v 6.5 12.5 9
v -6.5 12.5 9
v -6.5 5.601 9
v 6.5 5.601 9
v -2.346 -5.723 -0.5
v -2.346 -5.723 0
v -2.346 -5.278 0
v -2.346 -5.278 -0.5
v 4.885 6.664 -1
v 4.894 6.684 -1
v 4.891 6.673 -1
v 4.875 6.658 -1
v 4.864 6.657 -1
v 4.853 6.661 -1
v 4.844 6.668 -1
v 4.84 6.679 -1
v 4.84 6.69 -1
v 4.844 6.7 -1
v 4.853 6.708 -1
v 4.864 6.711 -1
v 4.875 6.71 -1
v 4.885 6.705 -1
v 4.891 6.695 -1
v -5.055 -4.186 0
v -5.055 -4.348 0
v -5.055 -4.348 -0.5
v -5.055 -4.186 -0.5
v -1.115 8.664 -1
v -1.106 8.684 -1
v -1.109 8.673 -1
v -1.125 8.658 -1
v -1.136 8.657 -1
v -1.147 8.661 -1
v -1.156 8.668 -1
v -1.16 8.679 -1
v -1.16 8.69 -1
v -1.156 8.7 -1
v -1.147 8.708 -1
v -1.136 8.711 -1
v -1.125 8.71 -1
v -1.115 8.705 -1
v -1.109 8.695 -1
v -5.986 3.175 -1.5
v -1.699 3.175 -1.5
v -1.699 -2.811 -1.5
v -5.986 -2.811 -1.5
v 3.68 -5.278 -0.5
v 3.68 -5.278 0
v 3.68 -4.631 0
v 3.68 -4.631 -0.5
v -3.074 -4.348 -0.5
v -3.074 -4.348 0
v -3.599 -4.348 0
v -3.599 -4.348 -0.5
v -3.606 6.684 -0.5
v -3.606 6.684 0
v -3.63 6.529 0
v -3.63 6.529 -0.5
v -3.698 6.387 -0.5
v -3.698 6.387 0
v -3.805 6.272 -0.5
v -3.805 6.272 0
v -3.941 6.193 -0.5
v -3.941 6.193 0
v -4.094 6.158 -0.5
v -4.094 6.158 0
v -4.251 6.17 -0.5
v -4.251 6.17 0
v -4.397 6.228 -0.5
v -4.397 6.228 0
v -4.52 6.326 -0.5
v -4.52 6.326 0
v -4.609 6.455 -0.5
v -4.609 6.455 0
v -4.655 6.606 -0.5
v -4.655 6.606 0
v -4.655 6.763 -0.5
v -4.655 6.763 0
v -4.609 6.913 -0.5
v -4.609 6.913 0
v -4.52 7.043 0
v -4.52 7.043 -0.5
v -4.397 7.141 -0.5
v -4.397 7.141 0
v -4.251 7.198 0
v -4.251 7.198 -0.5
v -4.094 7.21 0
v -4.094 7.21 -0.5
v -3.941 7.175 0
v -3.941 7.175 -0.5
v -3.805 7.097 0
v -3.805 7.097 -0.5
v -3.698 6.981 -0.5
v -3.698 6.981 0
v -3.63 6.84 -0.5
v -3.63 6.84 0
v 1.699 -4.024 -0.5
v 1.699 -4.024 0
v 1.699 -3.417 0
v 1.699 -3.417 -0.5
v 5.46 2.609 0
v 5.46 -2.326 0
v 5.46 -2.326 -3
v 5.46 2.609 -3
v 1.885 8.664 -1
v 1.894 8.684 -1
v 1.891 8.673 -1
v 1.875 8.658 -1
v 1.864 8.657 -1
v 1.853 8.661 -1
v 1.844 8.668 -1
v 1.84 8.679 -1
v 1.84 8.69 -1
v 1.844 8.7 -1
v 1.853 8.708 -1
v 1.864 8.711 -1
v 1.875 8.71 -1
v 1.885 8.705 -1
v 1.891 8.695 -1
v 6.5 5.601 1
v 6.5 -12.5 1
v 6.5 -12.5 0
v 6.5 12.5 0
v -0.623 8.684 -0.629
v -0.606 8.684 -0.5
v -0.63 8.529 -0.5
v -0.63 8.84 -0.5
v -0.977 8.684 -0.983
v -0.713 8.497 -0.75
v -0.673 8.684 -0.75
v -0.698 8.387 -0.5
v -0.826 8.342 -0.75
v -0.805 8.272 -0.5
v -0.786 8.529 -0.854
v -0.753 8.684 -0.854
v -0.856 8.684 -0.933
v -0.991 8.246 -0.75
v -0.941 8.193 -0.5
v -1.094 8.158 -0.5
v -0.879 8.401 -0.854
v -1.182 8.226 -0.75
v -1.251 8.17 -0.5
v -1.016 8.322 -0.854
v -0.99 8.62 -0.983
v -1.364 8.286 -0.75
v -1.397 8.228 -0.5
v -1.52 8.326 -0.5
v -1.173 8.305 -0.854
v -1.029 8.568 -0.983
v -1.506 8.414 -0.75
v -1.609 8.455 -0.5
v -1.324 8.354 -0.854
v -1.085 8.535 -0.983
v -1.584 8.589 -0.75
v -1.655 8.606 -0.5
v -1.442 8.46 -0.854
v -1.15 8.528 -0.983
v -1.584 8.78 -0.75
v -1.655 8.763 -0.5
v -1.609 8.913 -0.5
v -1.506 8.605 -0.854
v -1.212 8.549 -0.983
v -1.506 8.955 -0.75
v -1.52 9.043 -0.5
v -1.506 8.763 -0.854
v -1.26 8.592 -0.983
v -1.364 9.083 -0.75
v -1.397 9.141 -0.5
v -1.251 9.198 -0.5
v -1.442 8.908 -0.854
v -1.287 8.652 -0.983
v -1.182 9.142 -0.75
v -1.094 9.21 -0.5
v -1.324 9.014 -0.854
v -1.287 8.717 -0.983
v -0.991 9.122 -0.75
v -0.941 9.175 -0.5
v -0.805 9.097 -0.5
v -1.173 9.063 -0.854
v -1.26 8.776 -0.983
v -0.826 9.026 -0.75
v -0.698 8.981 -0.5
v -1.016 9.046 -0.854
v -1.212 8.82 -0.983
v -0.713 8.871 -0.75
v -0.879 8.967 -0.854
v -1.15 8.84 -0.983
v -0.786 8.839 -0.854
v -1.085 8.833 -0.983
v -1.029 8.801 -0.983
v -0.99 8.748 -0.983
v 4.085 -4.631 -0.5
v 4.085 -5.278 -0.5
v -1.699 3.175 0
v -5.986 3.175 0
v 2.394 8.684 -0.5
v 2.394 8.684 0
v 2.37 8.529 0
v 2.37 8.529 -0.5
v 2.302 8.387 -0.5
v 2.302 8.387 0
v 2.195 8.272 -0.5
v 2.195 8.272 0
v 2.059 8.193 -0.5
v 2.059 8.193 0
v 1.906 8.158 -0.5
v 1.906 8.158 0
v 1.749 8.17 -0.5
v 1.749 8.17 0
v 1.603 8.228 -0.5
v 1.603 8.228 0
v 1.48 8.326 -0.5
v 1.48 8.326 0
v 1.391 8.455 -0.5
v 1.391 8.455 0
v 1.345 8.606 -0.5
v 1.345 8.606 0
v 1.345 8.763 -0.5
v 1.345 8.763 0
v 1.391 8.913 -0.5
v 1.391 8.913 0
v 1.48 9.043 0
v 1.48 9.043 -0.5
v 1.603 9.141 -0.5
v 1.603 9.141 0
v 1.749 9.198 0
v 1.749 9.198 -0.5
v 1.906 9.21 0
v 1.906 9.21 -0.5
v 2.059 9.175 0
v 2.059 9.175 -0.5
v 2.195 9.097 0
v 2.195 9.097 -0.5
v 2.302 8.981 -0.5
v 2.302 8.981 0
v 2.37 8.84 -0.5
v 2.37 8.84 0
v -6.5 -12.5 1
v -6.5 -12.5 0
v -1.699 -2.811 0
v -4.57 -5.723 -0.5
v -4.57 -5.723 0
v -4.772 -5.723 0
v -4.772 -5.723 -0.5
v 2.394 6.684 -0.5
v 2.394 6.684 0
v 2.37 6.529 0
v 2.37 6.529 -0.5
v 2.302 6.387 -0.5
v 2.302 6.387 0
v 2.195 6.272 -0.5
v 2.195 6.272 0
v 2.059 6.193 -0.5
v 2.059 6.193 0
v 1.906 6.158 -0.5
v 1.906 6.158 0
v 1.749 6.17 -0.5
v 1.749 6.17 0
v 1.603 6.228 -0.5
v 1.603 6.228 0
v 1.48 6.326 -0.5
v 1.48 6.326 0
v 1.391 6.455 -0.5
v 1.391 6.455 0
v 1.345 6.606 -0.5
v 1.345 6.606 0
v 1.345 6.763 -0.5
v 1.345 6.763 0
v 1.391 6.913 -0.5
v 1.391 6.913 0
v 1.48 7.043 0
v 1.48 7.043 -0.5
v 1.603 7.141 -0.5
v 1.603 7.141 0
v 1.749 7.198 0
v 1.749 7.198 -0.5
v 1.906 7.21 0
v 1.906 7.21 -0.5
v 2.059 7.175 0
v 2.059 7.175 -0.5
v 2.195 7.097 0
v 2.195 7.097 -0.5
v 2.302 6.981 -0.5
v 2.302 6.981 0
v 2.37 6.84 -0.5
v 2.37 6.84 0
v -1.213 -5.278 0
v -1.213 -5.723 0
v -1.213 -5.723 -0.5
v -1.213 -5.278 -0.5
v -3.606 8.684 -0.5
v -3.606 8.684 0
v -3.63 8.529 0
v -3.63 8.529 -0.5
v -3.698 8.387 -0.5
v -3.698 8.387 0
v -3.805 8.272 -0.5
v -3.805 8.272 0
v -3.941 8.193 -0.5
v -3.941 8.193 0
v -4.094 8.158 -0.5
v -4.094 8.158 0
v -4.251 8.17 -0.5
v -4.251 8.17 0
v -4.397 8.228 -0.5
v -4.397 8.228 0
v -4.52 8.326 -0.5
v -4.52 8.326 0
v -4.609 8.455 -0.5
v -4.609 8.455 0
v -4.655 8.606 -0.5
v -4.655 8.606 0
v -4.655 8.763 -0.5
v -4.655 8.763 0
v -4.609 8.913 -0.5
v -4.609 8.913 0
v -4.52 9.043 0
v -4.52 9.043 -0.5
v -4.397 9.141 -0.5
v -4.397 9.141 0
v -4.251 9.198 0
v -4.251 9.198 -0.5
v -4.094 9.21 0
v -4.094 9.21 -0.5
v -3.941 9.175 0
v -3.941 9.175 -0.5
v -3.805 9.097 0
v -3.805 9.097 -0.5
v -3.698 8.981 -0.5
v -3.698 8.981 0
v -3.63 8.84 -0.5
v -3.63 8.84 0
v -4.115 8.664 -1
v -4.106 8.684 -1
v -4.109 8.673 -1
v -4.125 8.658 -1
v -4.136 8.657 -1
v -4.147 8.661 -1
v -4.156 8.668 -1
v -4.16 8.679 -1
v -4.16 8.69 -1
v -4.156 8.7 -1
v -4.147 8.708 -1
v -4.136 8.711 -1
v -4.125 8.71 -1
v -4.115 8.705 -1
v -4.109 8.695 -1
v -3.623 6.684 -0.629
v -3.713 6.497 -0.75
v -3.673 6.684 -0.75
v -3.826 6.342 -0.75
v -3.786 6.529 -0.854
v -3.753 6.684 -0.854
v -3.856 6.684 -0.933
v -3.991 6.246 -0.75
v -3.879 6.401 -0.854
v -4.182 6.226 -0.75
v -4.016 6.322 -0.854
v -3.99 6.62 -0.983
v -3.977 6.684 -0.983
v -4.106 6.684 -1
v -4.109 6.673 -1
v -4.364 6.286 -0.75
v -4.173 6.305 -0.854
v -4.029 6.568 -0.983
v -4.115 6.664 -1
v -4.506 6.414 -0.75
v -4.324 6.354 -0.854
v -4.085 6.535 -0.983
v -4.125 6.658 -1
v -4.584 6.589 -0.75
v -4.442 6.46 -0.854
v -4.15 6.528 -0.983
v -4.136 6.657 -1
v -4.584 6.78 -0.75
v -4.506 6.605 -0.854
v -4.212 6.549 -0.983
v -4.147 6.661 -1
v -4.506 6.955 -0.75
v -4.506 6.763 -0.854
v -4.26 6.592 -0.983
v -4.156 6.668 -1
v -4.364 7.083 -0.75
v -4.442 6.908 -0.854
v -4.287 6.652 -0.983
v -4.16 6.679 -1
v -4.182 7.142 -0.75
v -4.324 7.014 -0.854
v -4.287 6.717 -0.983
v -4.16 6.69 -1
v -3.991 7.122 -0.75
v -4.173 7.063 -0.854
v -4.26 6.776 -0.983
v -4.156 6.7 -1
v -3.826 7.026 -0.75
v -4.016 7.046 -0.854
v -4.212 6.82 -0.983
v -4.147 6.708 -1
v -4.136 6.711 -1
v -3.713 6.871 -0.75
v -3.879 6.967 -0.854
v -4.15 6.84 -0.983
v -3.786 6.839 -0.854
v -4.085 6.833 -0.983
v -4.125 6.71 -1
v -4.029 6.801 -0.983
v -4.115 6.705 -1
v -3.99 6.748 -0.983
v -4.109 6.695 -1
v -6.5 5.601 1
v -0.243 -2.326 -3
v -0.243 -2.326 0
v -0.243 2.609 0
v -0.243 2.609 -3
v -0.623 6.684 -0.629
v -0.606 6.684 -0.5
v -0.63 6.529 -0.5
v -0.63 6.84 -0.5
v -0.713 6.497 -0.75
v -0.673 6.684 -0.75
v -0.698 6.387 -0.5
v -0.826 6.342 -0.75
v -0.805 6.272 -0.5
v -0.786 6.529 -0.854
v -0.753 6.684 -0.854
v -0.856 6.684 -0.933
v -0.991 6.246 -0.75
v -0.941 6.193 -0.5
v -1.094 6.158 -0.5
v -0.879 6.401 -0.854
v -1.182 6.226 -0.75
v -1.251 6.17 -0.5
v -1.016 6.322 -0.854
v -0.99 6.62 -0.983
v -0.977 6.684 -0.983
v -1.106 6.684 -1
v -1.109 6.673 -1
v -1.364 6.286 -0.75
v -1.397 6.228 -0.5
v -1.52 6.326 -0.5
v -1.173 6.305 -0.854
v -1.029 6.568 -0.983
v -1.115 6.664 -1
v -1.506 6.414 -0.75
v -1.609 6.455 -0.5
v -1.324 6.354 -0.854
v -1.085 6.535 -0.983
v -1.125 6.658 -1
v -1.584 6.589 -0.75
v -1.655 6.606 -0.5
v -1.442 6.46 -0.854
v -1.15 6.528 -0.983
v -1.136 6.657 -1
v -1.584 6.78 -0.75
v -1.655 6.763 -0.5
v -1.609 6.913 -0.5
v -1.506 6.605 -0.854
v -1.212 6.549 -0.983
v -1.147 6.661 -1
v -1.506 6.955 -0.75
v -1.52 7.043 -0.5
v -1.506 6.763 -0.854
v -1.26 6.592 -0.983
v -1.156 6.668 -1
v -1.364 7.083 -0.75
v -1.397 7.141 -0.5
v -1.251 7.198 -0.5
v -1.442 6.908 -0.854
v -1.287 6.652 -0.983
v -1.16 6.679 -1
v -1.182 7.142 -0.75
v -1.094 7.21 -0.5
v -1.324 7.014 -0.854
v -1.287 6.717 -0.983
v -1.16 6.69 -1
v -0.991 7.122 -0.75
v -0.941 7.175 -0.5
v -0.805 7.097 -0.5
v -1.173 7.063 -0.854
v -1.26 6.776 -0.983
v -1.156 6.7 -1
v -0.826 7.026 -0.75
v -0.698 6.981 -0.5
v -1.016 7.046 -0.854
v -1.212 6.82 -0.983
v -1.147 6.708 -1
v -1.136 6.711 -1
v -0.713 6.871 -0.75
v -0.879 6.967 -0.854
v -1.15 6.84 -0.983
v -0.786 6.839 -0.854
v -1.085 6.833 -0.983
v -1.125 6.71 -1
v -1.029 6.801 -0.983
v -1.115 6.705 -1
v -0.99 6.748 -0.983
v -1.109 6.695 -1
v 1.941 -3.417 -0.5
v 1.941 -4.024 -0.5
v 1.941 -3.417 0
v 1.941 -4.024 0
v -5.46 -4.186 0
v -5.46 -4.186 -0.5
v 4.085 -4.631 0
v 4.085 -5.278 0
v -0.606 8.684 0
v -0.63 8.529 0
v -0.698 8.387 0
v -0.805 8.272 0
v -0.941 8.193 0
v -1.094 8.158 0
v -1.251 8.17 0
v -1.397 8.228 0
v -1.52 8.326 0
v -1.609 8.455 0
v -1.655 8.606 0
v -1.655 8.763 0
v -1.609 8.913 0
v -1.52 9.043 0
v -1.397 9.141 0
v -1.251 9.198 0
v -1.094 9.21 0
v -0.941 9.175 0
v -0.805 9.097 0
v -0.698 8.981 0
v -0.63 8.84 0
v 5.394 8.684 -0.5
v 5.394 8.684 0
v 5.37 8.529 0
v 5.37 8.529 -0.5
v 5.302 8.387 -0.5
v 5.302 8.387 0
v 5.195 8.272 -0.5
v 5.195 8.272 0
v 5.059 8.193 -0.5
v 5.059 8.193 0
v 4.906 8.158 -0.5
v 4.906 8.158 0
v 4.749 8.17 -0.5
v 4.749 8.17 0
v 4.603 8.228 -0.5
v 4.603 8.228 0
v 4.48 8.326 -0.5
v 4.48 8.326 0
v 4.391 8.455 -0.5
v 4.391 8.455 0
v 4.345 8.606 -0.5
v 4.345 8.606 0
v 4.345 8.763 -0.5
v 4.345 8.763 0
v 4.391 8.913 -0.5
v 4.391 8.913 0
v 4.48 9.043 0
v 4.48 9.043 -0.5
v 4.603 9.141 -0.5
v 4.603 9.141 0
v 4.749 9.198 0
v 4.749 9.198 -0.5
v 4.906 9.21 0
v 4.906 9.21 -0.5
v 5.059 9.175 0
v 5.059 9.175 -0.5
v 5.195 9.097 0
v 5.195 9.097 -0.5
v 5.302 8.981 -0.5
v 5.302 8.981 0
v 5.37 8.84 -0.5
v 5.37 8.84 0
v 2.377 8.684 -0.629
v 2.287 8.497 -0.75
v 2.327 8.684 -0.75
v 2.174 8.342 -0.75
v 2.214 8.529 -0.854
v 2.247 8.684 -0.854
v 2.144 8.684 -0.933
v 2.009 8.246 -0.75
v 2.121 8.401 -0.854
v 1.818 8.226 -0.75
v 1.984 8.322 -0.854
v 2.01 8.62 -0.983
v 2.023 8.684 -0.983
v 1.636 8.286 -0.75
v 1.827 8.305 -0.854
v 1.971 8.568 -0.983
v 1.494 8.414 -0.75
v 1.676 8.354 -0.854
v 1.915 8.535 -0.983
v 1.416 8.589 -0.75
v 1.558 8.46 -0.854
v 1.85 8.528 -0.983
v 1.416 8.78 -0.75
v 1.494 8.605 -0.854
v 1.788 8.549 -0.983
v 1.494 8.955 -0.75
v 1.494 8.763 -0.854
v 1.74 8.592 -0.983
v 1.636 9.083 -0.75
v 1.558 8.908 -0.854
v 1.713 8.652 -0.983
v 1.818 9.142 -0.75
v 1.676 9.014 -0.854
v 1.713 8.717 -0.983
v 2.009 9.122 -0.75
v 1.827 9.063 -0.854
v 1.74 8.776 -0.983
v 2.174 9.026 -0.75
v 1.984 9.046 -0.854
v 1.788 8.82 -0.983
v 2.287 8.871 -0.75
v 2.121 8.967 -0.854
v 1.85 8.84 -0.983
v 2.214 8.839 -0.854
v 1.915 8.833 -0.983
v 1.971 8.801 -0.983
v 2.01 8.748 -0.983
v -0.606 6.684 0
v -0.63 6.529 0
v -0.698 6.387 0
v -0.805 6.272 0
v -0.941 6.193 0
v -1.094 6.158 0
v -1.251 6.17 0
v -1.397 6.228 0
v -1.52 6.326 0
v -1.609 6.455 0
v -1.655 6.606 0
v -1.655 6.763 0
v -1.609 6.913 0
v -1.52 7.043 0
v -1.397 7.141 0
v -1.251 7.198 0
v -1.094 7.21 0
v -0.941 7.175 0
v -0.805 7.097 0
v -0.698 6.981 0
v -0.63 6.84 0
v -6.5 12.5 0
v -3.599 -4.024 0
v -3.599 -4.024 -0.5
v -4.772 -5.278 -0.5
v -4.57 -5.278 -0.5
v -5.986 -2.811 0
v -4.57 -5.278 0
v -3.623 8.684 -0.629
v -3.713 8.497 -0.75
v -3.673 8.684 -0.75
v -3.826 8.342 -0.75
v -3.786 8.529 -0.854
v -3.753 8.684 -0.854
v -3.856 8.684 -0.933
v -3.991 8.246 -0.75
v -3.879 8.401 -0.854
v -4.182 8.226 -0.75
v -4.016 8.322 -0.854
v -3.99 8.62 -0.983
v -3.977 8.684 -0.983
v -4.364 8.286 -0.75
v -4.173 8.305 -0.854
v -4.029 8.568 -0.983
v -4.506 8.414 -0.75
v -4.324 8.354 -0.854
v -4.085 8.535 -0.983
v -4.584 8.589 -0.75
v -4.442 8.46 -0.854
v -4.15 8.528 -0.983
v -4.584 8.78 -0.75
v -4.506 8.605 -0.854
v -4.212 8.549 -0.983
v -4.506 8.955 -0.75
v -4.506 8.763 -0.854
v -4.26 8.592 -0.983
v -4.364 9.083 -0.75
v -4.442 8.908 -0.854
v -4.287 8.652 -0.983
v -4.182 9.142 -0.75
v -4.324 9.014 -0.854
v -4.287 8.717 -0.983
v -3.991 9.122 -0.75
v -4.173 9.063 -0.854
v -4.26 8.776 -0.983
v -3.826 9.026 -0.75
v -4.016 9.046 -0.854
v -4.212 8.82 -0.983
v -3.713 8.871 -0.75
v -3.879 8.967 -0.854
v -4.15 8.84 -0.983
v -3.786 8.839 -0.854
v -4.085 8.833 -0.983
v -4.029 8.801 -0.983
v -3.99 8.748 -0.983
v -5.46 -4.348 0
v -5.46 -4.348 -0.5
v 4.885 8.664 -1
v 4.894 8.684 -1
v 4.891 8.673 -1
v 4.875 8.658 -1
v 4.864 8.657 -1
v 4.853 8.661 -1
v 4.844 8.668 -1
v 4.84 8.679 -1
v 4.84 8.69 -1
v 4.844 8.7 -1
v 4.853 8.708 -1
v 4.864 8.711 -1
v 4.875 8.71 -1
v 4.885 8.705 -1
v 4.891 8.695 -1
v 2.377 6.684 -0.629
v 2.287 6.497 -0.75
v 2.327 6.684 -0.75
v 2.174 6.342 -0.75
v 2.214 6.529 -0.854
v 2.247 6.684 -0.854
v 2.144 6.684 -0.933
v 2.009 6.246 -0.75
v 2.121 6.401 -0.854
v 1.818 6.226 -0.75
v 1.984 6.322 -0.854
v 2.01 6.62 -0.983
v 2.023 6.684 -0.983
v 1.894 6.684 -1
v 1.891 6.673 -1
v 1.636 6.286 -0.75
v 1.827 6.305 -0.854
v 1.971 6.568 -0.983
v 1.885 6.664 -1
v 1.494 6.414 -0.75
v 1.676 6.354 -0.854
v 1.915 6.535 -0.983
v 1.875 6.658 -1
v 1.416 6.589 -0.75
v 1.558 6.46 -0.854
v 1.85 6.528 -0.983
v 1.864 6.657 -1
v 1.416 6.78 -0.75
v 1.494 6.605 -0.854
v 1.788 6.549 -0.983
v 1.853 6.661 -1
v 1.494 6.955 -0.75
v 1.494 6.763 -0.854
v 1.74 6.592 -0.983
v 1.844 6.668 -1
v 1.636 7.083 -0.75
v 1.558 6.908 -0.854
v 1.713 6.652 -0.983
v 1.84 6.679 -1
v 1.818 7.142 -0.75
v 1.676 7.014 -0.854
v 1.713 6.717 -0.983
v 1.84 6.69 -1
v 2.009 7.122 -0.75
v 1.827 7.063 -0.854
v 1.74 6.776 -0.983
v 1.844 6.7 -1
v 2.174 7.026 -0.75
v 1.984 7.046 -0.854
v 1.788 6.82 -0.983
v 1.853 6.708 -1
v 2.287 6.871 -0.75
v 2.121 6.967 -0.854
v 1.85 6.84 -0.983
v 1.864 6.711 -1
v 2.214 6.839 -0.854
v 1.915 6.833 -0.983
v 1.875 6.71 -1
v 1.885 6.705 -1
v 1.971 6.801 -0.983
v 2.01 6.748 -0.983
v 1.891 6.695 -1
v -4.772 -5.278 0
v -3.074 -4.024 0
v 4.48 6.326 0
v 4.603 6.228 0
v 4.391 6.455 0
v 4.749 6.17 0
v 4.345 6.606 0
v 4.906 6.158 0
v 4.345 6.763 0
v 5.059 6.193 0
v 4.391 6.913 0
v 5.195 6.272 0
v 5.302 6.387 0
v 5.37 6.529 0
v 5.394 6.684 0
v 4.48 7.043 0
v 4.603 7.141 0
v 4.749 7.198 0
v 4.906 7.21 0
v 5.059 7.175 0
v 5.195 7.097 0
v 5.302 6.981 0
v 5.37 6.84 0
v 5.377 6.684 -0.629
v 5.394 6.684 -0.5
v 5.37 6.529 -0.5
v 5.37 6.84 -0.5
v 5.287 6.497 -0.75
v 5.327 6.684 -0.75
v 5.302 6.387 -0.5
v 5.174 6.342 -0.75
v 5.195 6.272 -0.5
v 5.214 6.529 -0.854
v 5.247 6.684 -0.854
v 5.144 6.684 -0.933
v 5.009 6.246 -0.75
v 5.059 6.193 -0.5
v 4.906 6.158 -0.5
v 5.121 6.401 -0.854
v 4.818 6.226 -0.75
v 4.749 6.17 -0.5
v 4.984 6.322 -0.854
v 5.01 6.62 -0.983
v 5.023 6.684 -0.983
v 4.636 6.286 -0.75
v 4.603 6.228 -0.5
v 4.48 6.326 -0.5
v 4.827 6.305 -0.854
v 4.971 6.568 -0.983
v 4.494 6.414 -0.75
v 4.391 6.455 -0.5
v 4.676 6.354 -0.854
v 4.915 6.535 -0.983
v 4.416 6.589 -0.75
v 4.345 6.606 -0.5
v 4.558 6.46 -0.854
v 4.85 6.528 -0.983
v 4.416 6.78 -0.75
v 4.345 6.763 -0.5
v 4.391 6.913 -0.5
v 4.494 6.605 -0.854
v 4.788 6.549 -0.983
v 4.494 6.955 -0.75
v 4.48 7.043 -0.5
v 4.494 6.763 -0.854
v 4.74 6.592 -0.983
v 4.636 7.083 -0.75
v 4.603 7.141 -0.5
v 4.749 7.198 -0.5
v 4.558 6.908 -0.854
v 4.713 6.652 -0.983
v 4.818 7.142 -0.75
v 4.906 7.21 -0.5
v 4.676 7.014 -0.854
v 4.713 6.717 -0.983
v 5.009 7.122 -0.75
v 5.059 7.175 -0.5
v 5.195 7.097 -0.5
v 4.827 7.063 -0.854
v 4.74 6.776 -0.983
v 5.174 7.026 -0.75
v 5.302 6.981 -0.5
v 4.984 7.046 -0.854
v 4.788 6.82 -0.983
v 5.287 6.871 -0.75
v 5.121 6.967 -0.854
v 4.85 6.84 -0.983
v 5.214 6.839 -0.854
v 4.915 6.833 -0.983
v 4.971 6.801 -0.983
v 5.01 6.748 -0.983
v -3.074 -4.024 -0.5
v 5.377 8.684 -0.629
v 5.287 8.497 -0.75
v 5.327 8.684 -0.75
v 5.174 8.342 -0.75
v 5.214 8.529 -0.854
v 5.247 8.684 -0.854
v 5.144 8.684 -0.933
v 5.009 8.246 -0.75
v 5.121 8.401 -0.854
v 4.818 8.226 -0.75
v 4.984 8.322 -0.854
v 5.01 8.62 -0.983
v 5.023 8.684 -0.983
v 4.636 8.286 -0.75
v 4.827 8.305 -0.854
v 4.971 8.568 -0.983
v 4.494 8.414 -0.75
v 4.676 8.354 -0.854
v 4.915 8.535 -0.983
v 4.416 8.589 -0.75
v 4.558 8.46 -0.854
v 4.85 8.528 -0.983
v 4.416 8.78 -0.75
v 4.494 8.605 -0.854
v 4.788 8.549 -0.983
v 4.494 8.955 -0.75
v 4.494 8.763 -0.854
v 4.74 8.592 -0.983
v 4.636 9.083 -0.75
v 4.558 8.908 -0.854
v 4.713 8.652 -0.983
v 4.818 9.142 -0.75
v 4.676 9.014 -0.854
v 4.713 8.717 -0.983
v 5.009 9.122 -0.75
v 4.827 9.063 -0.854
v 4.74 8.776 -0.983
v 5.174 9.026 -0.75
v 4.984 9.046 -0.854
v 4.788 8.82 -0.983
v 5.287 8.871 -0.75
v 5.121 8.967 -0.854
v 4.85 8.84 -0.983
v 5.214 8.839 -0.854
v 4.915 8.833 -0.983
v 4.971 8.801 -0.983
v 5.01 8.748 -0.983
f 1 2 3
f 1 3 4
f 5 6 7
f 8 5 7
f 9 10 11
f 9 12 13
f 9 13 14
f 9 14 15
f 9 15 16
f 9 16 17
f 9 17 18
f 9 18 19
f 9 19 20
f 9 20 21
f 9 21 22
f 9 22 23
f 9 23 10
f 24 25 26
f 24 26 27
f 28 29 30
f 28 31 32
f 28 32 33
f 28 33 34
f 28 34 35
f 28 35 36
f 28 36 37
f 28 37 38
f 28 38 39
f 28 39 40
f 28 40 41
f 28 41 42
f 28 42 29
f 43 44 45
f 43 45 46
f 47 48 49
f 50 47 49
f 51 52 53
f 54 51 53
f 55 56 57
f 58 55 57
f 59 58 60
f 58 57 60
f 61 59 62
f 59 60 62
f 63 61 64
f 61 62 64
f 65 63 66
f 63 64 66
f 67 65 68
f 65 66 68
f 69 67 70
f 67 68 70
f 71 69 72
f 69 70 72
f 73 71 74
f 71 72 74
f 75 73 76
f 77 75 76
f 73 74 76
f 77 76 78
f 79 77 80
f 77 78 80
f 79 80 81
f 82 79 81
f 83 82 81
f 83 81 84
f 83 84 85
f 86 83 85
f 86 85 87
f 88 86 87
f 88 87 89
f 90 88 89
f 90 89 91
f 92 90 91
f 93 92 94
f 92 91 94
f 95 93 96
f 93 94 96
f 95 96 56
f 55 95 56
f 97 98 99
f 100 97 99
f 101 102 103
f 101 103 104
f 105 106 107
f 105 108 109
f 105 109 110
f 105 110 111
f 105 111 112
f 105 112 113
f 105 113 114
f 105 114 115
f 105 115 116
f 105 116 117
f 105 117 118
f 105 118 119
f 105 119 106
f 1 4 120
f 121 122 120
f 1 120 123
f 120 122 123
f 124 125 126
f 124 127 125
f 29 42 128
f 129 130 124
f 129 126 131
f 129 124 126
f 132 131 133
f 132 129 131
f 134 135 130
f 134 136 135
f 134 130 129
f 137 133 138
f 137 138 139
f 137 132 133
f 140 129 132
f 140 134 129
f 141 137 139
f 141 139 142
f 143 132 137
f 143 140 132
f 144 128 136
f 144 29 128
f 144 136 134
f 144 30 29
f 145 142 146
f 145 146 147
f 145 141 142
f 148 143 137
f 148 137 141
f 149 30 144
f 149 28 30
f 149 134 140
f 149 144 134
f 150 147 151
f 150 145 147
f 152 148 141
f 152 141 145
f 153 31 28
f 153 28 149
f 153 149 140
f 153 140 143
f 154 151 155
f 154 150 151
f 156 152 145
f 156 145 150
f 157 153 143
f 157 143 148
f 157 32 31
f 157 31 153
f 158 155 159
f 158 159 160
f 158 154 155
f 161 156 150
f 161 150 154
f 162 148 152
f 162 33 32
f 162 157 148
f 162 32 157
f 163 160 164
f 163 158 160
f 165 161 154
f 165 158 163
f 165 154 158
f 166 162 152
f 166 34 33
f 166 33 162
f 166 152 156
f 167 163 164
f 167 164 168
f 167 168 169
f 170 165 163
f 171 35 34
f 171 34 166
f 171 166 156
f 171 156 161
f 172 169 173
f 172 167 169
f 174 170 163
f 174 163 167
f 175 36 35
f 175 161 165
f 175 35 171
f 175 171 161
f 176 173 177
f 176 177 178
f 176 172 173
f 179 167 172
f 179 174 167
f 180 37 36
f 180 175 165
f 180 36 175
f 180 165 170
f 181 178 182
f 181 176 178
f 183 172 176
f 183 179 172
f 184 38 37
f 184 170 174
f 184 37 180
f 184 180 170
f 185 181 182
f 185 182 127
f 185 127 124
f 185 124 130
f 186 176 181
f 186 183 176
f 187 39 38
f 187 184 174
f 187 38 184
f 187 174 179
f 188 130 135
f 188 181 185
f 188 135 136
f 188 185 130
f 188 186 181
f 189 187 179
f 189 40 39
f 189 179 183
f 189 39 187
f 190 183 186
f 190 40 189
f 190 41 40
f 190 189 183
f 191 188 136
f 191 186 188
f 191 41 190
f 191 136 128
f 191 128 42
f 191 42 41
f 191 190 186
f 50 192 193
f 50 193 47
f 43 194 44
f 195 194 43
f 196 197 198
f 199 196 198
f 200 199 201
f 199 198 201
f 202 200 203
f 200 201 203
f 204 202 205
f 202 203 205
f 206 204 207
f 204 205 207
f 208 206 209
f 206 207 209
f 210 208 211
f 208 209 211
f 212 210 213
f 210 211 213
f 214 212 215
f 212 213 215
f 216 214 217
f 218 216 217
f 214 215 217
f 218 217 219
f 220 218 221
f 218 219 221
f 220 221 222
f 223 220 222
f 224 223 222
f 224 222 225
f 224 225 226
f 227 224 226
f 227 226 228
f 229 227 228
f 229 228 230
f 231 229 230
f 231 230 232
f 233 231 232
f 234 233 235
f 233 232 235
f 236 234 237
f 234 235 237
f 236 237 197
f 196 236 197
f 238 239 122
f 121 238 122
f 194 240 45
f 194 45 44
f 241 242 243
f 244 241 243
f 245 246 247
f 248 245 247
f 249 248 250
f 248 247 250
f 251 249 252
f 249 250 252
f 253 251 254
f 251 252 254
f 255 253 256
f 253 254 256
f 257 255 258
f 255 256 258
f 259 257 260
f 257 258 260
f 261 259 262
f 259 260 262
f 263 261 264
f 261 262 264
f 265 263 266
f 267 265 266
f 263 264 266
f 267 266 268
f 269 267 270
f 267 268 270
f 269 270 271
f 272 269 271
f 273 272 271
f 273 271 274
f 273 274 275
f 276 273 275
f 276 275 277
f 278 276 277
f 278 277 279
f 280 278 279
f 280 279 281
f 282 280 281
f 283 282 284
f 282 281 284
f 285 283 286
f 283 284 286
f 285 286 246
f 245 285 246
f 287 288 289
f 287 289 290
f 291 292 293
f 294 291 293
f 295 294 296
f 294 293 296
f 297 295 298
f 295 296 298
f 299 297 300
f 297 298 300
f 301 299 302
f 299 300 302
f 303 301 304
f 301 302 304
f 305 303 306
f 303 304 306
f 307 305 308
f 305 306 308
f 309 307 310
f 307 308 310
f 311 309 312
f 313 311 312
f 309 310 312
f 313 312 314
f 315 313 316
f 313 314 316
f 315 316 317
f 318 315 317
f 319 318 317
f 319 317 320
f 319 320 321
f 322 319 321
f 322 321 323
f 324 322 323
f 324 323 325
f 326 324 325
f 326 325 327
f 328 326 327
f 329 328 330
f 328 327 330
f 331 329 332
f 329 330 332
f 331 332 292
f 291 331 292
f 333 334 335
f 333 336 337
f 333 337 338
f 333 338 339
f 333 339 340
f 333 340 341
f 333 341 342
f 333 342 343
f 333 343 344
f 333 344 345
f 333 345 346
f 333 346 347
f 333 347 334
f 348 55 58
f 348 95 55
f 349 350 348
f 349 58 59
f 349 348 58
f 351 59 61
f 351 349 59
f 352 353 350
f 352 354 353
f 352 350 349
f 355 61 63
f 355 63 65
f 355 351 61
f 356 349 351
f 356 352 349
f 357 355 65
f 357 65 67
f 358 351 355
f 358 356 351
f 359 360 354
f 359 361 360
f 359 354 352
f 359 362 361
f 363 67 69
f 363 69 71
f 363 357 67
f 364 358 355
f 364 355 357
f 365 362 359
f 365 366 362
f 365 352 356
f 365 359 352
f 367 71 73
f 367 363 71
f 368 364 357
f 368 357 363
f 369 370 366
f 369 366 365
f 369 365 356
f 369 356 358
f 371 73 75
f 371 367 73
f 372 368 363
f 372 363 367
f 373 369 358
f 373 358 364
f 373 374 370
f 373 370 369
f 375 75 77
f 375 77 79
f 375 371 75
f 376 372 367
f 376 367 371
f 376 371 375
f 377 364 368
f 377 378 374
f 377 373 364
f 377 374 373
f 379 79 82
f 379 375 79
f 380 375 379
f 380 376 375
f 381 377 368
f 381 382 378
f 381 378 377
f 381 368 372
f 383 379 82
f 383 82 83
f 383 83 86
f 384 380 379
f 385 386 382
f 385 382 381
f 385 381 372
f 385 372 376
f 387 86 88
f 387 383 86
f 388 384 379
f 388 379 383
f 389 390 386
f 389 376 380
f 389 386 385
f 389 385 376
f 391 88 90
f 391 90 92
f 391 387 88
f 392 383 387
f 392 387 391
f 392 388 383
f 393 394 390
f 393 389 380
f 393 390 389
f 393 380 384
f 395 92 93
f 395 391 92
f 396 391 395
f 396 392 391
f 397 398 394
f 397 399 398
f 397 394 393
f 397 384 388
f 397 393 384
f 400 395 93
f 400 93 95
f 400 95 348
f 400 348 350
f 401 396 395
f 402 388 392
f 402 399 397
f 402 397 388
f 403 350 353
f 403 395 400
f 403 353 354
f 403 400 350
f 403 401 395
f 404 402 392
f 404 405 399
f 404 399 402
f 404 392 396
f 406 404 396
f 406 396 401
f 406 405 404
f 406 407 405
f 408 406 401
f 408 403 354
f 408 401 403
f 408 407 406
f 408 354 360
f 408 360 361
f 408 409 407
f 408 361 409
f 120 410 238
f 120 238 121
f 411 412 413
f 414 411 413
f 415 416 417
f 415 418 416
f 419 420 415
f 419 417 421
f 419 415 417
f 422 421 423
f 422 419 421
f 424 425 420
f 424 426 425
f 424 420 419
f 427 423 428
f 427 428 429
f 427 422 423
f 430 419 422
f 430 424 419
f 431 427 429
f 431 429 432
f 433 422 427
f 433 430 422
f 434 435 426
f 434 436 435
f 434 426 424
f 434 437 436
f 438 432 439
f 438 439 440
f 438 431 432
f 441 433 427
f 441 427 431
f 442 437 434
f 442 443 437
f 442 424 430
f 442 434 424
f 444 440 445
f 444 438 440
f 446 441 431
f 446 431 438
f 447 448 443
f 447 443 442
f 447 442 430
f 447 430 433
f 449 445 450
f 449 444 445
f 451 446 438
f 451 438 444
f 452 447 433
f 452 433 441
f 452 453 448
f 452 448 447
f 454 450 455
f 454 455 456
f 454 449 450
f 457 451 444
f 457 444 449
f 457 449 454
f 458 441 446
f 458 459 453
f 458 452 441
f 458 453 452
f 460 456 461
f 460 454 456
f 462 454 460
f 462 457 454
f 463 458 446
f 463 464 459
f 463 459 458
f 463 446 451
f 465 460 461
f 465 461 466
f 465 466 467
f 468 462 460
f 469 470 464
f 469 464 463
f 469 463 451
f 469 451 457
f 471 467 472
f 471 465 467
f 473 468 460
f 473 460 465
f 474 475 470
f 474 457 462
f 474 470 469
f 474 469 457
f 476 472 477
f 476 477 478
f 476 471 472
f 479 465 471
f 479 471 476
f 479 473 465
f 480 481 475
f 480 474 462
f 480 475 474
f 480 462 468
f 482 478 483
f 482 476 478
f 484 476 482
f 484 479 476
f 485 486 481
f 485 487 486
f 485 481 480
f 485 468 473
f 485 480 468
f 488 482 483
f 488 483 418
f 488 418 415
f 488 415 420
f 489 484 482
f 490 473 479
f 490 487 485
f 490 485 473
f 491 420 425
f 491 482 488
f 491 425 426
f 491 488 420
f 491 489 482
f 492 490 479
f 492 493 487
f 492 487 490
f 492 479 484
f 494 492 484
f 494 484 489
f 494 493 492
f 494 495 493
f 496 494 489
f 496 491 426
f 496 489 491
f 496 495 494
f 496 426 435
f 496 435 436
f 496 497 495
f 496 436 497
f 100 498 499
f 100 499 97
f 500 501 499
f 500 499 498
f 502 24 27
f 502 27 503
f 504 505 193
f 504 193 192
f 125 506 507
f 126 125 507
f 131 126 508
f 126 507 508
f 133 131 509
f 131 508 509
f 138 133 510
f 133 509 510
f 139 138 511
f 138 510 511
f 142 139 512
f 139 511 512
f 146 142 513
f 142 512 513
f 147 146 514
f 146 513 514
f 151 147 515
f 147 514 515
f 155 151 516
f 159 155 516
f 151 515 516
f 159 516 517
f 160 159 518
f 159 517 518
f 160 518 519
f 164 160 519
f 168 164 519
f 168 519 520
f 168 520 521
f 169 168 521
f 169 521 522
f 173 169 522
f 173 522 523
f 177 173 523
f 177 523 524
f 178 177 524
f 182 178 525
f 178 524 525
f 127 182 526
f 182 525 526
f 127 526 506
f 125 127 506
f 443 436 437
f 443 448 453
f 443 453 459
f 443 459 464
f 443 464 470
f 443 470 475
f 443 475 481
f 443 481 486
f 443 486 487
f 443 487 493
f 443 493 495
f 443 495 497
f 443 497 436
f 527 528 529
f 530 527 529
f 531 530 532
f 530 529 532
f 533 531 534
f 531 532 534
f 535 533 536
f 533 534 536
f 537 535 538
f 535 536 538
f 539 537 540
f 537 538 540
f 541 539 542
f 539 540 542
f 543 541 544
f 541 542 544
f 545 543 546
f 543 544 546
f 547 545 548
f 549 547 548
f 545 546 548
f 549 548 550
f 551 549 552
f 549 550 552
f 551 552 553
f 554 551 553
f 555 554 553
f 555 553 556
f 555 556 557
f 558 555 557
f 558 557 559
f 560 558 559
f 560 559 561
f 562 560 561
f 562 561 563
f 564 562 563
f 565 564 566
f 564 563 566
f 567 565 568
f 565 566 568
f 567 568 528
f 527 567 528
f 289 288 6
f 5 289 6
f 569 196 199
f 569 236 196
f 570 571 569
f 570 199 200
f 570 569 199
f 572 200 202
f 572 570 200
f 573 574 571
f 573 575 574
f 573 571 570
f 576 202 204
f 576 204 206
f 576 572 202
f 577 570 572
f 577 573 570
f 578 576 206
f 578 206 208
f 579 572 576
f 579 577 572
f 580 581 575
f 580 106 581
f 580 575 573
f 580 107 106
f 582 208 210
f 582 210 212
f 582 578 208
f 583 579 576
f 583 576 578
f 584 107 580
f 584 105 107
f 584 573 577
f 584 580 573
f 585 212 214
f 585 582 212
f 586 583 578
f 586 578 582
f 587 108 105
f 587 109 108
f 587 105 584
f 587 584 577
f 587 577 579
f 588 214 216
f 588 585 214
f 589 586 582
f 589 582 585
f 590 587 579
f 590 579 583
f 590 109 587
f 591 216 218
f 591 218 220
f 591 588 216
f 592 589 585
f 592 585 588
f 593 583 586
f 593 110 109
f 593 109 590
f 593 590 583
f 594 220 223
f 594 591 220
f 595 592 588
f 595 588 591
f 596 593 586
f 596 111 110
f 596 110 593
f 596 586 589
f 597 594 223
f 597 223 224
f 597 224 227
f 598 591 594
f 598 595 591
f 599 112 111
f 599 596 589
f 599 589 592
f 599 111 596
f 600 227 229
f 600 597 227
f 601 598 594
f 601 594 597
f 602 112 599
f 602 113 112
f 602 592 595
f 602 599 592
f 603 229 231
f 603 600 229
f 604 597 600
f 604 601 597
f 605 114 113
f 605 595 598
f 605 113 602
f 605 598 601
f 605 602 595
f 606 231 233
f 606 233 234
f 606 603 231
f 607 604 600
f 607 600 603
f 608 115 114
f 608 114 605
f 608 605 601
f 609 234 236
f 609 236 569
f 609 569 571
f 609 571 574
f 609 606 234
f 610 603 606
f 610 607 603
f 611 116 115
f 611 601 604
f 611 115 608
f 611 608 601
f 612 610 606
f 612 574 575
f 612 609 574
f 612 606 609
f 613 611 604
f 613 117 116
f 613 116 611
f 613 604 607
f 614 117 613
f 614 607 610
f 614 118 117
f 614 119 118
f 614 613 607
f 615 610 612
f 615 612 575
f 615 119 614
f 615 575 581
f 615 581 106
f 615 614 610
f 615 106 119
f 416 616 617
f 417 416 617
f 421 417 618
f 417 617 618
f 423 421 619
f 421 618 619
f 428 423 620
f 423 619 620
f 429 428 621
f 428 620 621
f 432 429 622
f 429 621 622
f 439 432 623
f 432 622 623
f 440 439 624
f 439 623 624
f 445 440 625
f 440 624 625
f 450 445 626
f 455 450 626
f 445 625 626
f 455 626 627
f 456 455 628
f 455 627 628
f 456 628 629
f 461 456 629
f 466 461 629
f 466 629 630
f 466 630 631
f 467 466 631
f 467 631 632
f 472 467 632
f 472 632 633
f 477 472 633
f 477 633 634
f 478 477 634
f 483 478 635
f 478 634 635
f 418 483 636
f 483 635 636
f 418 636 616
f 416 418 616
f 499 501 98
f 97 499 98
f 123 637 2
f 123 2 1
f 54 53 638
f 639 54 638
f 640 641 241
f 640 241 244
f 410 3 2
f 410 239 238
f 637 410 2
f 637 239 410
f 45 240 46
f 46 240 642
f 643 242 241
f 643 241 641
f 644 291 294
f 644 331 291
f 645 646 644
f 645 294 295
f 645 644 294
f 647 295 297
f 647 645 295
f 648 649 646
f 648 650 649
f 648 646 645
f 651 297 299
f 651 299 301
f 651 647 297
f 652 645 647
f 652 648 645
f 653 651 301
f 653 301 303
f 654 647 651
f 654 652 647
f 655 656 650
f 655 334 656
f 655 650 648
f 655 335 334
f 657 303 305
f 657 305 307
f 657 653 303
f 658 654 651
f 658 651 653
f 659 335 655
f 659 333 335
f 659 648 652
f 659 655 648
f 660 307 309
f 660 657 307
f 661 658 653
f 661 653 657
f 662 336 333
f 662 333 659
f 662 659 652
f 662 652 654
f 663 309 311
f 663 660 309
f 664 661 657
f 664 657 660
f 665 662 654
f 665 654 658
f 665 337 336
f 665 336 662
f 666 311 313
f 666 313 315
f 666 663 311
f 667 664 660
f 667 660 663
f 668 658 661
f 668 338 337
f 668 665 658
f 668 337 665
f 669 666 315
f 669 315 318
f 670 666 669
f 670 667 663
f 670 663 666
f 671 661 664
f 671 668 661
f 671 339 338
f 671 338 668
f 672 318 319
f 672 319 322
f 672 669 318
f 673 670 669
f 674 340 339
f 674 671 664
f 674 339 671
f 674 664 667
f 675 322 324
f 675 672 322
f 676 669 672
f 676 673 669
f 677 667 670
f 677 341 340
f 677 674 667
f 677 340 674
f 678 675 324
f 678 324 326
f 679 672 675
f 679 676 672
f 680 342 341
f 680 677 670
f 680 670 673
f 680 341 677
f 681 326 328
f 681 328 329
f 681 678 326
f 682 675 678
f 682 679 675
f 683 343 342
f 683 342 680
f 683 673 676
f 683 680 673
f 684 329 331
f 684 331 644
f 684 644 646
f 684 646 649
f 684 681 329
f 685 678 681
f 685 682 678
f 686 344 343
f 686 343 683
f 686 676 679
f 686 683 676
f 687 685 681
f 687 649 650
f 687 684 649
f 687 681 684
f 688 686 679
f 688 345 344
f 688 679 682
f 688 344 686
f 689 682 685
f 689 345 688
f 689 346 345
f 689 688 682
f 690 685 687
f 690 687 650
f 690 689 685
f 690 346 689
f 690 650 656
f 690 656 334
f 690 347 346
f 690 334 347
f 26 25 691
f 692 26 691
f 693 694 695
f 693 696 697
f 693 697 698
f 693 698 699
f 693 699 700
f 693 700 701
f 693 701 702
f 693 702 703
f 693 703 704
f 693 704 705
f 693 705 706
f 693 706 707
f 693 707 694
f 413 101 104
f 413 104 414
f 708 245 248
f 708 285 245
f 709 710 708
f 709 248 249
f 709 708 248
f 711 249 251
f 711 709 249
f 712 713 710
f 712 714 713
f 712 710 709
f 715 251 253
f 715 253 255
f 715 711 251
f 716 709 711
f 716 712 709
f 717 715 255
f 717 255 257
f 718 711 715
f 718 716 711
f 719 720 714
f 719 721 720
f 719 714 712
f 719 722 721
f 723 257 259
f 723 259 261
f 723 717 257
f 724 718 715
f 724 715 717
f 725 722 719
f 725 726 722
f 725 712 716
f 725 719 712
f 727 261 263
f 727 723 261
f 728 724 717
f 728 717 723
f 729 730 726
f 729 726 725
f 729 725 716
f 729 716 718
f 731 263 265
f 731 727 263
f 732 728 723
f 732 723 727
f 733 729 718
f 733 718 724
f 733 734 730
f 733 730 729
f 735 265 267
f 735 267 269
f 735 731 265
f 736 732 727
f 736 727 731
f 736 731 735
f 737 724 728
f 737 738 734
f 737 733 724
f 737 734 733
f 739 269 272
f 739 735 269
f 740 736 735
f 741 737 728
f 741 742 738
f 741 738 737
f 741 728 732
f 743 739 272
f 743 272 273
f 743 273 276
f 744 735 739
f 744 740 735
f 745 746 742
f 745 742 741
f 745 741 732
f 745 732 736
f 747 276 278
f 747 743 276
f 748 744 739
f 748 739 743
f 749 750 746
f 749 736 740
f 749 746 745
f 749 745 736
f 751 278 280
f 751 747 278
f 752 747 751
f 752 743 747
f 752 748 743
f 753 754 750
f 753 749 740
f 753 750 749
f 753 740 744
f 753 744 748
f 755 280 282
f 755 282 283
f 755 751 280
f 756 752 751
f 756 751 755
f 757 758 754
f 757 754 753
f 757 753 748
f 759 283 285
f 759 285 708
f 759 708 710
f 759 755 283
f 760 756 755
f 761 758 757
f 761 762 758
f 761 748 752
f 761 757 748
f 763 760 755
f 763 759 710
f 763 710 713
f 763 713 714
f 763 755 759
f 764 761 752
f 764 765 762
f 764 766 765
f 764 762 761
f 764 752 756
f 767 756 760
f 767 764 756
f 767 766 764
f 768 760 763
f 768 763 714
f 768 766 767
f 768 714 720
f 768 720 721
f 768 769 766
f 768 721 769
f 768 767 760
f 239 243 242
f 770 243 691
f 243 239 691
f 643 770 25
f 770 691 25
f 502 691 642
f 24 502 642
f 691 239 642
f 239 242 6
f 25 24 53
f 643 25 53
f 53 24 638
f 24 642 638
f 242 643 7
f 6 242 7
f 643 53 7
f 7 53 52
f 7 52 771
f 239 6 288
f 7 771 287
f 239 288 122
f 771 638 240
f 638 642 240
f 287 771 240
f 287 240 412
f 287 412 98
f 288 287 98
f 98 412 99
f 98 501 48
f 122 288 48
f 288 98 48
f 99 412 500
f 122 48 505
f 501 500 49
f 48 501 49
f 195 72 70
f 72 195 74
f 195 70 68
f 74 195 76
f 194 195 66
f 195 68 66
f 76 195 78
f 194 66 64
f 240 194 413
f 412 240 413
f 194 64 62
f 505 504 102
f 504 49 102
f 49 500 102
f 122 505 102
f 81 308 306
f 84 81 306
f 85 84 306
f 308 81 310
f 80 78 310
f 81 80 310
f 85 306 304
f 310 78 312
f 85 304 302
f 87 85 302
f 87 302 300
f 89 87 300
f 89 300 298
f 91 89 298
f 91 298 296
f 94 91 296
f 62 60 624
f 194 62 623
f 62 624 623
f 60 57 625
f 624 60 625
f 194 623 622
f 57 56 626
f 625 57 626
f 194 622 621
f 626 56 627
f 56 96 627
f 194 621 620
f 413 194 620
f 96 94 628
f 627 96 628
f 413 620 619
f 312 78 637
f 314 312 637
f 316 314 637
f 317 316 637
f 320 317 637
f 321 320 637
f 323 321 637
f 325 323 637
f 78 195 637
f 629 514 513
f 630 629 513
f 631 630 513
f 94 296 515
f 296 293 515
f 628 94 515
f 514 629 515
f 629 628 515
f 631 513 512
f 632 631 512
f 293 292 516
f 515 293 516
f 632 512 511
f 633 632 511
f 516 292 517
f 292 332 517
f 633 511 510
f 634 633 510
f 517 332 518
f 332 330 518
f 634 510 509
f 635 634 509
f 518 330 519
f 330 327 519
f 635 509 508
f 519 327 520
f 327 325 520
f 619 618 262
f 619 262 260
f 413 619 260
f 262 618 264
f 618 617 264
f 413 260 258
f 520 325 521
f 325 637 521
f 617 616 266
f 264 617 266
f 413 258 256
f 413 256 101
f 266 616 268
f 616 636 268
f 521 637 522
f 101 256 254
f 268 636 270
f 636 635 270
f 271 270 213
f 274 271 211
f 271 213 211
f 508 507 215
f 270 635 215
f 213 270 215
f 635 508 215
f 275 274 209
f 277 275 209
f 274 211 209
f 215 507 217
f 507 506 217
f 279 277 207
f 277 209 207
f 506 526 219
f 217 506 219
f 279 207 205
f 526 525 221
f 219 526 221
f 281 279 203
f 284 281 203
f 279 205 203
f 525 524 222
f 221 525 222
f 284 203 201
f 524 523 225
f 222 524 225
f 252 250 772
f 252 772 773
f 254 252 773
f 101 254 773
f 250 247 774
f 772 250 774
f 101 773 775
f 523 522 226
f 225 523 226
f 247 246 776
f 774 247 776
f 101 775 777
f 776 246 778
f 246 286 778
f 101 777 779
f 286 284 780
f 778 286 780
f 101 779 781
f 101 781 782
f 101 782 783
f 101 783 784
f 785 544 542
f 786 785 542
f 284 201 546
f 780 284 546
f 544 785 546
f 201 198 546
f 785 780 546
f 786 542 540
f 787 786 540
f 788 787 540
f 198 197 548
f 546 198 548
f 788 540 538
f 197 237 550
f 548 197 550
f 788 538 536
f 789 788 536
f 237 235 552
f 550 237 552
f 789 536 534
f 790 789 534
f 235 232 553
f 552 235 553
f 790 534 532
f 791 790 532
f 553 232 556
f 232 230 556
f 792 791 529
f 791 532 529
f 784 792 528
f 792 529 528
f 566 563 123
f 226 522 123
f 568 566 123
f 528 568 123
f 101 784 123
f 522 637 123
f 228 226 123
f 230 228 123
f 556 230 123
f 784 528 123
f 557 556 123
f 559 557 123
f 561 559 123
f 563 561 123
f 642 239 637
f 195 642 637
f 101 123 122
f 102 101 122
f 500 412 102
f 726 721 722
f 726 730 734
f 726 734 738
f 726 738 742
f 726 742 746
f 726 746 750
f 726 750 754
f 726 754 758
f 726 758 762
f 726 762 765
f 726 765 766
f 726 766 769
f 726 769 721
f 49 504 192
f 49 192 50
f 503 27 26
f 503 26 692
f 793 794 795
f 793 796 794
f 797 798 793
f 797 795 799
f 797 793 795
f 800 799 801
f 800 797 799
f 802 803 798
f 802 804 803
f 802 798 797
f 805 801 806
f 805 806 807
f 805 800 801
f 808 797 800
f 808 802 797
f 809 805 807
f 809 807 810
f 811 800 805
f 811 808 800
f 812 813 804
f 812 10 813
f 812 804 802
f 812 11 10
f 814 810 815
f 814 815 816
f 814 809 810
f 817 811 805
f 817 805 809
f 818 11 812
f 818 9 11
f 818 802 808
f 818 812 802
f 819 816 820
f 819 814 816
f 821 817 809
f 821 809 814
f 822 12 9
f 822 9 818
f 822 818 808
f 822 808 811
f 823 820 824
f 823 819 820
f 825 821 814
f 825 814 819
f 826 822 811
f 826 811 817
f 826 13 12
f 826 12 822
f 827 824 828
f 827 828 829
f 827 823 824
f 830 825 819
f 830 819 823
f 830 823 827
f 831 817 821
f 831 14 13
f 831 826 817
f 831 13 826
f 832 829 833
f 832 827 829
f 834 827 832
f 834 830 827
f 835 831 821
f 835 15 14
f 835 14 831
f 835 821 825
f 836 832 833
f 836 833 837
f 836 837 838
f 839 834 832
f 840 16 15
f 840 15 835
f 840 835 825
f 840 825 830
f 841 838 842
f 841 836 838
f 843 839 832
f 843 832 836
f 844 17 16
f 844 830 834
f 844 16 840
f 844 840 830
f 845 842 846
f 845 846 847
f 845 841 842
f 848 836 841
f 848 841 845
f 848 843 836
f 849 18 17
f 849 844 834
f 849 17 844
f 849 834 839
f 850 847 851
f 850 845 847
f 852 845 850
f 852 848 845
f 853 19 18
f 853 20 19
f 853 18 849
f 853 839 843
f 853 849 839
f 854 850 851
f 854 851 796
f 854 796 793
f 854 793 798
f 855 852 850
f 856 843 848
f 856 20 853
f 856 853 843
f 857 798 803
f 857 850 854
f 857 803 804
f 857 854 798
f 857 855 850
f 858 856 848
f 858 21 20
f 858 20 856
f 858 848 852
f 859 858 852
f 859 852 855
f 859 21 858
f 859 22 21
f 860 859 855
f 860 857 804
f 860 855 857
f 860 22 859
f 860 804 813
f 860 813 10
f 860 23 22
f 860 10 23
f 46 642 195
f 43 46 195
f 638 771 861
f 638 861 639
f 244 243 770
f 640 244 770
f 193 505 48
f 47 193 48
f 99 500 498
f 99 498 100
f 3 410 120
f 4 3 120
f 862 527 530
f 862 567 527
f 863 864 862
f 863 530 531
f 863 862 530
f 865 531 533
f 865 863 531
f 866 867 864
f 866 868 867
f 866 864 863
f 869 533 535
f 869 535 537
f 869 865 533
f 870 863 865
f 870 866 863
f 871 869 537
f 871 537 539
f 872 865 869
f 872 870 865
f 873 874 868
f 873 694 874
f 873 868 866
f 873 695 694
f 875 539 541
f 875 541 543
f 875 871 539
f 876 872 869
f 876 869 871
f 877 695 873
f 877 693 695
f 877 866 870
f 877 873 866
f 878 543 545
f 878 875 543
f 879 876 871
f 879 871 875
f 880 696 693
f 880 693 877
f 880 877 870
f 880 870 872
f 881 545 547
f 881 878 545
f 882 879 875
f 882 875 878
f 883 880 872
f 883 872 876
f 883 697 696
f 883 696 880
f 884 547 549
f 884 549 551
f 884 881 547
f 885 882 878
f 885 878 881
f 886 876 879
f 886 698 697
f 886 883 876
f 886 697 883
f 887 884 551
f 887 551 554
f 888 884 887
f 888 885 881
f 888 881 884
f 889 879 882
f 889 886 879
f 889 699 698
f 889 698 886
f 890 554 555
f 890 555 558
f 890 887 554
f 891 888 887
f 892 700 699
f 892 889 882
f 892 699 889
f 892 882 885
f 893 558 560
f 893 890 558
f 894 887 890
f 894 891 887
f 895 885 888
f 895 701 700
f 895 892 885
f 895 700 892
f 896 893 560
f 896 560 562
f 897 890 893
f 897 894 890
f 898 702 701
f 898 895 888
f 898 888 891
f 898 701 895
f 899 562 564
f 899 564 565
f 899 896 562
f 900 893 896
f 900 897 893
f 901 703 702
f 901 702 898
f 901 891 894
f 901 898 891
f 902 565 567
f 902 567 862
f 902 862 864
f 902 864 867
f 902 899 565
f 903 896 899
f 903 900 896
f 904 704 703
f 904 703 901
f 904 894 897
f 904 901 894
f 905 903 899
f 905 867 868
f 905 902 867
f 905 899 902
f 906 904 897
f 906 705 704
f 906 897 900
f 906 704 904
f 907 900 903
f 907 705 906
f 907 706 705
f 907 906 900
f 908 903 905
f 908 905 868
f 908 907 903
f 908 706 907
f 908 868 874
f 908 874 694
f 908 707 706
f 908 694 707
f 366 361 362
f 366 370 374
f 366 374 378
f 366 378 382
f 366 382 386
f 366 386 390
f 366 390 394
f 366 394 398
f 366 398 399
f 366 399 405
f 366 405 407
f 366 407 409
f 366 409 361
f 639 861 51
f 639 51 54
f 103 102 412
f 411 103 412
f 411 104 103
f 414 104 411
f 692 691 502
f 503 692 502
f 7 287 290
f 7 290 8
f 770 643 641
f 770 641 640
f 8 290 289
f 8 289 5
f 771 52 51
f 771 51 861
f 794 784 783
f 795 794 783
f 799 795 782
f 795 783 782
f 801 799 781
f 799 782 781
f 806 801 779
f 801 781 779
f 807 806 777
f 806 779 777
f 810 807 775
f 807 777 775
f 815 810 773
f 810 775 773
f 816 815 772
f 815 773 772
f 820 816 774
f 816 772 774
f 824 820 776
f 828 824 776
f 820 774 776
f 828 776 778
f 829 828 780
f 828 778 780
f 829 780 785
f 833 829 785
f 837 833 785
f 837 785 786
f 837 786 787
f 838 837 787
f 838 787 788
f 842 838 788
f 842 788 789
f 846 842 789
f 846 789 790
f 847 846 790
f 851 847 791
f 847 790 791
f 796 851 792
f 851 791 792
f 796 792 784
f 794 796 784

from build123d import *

# Parameters (mm, degrees)
SKETCH_1_W      = 13
SKETCH_1_H      = 25
EXTRUDE_1_DEPTH = 1
SKETCH_2_W      = 13
SKETCH_2_H      = 6.898597806
EXTRUDE_2_DEPTH = 8
SKETCH_3_R      = 0.52733121
EXTRUDE_3_DEPTH = 1
FILLET_3_R      = 0.5
FILLET_4_R      = 0.5
SKETCH_4_W      = 5.702517664
SKETCH_4_H      = 4.934093298
EXTRUDE_4_DEPTH = 3
SKETCH_5_W      = 4.286999095
SKETCH_5_H      = 5.985621379
EXTRUDE_5_DEPTH = 1.5
SKETCH_6_W      = 0.52576404
SKETCH_6_H      = 0.323547102
SKETCH_6_W_2    = 0.202216939
SKETCH_6_H_2    = 0.444877264
SKETCH_6_W_3    = 0.404433876
SKETCH_6_H_3    = 0.161773551
SKETCH_6_W_4    = 1.132414855
SKETCH_6_W_5    = 0.404433877
SKETCH_6_H_4    = 0.647094203
SKETCH_6_W_6    = 0.242660326
SKETCH_6_H_5    = 0.606650815
EXTRUDE_6_DEPTH = 0.5


with BuildPart() as part:
    # 草图1 → 凸台-拉伸1 (new body)
    with BuildSketch(Plane.XY):
        Rectangle(SKETCH_1_W, SKETCH_1_H)
    extrude(amount=EXTRUDE_1_DEPTH)

    # 草图2 → 凸台-拉伸2 (add)
    with BuildSketch(Plane.XY.offset(1)):
        with Locations((0, 9.050701097)):
            Rectangle(SKETCH_2_W, SKETCH_2_H)
    extrude(amount=EXTRUDE_2_DEPTH)

    # 草图3 → 凸台-拉伸3 (add)
    with BuildSketch(Plane(origin=(0, 0, 0), x_dir=(-1, 0, 0), z_dir=(0, 0, -1))):
        with Locations(Location((-4.86638581, 8.684245234, 0), (0, 0, 180))):
            Circle(SKETCH_3_R)
        with Locations(Location((-1.86638581, 8.684245234, 0), (0, 0, 180))):
            Circle(SKETCH_3_R)
        with Locations(Location((1.13361419, 8.684245234, 0), (0, 0, 180))):
            Circle(SKETCH_3_R)
        with Locations(Location((4.13361419, 8.684245234, 0), (0, 0, 180))):
            Circle(SKETCH_3_R)
        with Locations(Location((-1.86638581, 6.684245234, 0), (0, 0, 180))):
            Circle(SKETCH_3_R)
        with Locations(Location((1.13361419, 6.684245234, 0), (0, 0, 180))):
            Circle(SKETCH_3_R)
        with Locations(Location((4.13361419, 6.684245234, 0), (0, 0, 180))):
            Circle(SKETCH_3_R)
        with Locations(Location((-4.86638581, 6.684245234, 0), (0, 0, 180))):
            Circle(SKETCH_3_R)
    extrude(amount=EXTRUDE_3_DEPTH)

    # 圆角3
    fillet_3_edges = [part.edges().sort_by_distance(p)[0] for p in [
        (4.3390546, 8.684245234, -1),
    ]]
    fillet(fillet_3_edges, radius=FILLET_3_R)

    # 圆角4
    fillet_4_edges = [part.edges().sort_by_distance(p)[0] for p in [
        (1.3390546, 8.684245234, -1),
        (-1.6609454, 8.684245234, -1),
        (-4.6609454, 8.684245234, -1),
        (1.3390546, 6.684245234, -1),
        (-1.6609454, 6.684245234, -1),
        (-4.6609454, 6.684245234, -1),
        (4.3390546, 6.684245234, -1),
    ]]
    fillet(fillet_4_edges, radius=FILLET_4_R)

    # 草图4 → 凸台-拉伸4 (add)
    with BuildSketch(Plane(origin=(0, 0, 0), x_dir=(-1, 0, 0), z_dir=(0, 0, -1))):
        with Locations((-2.608598506, 0.141539357)):
            Rectangle(SKETCH_4_W, SKETCH_4_H)
    extrude(amount=EXTRUDE_4_DEPTH)

    # 草图5 → 凸台-拉伸5 (add)
    with BuildSketch(Plane(origin=(0, 0, 0), x_dir=(-1, 0, 0), z_dir=(0, 0, -1))):
        with Locations((3.842121831, 0.181982744)):
            Rectangle(SKETCH_5_W, SKETCH_5_H)
    extrude(amount=EXTRUDE_5_DEPTH)

    # 草图6 → 凸台-拉伸6 (add)
    with BuildSketch(Plane(origin=(0, 0, 0), x_dir=(-1, 0, 0), z_dir=(0, 0, -1))):
        with Locations((3.336579485, -4.185903126)):
            Rectangle(SKETCH_6_W, SKETCH_6_H)
        with Locations((4.671211279, -5.500313226)):
            Rectangle(SKETCH_6_W_2, SKETCH_6_H_2)
        with Locations((5.2576404, -4.266789902)):
            Rectangle(SKETCH_6_W_3, SKETCH_6_H_3)
        with Locations((1.779509058, -5.500313226)):
            Rectangle(SKETCH_6_W_4, SKETCH_6_H_2)
        with Locations((-3.882565218, -4.954327493)):
            Rectangle(SKETCH_6_W_5, SKETCH_6_H_4)
        with Locations((-1.819952446, -3.720804167)):
            Rectangle(SKETCH_6_W_6, SKETCH_6_H_5)
    extrude(amount=EXTRUDE_6_DEPTH)


solid = part.part
